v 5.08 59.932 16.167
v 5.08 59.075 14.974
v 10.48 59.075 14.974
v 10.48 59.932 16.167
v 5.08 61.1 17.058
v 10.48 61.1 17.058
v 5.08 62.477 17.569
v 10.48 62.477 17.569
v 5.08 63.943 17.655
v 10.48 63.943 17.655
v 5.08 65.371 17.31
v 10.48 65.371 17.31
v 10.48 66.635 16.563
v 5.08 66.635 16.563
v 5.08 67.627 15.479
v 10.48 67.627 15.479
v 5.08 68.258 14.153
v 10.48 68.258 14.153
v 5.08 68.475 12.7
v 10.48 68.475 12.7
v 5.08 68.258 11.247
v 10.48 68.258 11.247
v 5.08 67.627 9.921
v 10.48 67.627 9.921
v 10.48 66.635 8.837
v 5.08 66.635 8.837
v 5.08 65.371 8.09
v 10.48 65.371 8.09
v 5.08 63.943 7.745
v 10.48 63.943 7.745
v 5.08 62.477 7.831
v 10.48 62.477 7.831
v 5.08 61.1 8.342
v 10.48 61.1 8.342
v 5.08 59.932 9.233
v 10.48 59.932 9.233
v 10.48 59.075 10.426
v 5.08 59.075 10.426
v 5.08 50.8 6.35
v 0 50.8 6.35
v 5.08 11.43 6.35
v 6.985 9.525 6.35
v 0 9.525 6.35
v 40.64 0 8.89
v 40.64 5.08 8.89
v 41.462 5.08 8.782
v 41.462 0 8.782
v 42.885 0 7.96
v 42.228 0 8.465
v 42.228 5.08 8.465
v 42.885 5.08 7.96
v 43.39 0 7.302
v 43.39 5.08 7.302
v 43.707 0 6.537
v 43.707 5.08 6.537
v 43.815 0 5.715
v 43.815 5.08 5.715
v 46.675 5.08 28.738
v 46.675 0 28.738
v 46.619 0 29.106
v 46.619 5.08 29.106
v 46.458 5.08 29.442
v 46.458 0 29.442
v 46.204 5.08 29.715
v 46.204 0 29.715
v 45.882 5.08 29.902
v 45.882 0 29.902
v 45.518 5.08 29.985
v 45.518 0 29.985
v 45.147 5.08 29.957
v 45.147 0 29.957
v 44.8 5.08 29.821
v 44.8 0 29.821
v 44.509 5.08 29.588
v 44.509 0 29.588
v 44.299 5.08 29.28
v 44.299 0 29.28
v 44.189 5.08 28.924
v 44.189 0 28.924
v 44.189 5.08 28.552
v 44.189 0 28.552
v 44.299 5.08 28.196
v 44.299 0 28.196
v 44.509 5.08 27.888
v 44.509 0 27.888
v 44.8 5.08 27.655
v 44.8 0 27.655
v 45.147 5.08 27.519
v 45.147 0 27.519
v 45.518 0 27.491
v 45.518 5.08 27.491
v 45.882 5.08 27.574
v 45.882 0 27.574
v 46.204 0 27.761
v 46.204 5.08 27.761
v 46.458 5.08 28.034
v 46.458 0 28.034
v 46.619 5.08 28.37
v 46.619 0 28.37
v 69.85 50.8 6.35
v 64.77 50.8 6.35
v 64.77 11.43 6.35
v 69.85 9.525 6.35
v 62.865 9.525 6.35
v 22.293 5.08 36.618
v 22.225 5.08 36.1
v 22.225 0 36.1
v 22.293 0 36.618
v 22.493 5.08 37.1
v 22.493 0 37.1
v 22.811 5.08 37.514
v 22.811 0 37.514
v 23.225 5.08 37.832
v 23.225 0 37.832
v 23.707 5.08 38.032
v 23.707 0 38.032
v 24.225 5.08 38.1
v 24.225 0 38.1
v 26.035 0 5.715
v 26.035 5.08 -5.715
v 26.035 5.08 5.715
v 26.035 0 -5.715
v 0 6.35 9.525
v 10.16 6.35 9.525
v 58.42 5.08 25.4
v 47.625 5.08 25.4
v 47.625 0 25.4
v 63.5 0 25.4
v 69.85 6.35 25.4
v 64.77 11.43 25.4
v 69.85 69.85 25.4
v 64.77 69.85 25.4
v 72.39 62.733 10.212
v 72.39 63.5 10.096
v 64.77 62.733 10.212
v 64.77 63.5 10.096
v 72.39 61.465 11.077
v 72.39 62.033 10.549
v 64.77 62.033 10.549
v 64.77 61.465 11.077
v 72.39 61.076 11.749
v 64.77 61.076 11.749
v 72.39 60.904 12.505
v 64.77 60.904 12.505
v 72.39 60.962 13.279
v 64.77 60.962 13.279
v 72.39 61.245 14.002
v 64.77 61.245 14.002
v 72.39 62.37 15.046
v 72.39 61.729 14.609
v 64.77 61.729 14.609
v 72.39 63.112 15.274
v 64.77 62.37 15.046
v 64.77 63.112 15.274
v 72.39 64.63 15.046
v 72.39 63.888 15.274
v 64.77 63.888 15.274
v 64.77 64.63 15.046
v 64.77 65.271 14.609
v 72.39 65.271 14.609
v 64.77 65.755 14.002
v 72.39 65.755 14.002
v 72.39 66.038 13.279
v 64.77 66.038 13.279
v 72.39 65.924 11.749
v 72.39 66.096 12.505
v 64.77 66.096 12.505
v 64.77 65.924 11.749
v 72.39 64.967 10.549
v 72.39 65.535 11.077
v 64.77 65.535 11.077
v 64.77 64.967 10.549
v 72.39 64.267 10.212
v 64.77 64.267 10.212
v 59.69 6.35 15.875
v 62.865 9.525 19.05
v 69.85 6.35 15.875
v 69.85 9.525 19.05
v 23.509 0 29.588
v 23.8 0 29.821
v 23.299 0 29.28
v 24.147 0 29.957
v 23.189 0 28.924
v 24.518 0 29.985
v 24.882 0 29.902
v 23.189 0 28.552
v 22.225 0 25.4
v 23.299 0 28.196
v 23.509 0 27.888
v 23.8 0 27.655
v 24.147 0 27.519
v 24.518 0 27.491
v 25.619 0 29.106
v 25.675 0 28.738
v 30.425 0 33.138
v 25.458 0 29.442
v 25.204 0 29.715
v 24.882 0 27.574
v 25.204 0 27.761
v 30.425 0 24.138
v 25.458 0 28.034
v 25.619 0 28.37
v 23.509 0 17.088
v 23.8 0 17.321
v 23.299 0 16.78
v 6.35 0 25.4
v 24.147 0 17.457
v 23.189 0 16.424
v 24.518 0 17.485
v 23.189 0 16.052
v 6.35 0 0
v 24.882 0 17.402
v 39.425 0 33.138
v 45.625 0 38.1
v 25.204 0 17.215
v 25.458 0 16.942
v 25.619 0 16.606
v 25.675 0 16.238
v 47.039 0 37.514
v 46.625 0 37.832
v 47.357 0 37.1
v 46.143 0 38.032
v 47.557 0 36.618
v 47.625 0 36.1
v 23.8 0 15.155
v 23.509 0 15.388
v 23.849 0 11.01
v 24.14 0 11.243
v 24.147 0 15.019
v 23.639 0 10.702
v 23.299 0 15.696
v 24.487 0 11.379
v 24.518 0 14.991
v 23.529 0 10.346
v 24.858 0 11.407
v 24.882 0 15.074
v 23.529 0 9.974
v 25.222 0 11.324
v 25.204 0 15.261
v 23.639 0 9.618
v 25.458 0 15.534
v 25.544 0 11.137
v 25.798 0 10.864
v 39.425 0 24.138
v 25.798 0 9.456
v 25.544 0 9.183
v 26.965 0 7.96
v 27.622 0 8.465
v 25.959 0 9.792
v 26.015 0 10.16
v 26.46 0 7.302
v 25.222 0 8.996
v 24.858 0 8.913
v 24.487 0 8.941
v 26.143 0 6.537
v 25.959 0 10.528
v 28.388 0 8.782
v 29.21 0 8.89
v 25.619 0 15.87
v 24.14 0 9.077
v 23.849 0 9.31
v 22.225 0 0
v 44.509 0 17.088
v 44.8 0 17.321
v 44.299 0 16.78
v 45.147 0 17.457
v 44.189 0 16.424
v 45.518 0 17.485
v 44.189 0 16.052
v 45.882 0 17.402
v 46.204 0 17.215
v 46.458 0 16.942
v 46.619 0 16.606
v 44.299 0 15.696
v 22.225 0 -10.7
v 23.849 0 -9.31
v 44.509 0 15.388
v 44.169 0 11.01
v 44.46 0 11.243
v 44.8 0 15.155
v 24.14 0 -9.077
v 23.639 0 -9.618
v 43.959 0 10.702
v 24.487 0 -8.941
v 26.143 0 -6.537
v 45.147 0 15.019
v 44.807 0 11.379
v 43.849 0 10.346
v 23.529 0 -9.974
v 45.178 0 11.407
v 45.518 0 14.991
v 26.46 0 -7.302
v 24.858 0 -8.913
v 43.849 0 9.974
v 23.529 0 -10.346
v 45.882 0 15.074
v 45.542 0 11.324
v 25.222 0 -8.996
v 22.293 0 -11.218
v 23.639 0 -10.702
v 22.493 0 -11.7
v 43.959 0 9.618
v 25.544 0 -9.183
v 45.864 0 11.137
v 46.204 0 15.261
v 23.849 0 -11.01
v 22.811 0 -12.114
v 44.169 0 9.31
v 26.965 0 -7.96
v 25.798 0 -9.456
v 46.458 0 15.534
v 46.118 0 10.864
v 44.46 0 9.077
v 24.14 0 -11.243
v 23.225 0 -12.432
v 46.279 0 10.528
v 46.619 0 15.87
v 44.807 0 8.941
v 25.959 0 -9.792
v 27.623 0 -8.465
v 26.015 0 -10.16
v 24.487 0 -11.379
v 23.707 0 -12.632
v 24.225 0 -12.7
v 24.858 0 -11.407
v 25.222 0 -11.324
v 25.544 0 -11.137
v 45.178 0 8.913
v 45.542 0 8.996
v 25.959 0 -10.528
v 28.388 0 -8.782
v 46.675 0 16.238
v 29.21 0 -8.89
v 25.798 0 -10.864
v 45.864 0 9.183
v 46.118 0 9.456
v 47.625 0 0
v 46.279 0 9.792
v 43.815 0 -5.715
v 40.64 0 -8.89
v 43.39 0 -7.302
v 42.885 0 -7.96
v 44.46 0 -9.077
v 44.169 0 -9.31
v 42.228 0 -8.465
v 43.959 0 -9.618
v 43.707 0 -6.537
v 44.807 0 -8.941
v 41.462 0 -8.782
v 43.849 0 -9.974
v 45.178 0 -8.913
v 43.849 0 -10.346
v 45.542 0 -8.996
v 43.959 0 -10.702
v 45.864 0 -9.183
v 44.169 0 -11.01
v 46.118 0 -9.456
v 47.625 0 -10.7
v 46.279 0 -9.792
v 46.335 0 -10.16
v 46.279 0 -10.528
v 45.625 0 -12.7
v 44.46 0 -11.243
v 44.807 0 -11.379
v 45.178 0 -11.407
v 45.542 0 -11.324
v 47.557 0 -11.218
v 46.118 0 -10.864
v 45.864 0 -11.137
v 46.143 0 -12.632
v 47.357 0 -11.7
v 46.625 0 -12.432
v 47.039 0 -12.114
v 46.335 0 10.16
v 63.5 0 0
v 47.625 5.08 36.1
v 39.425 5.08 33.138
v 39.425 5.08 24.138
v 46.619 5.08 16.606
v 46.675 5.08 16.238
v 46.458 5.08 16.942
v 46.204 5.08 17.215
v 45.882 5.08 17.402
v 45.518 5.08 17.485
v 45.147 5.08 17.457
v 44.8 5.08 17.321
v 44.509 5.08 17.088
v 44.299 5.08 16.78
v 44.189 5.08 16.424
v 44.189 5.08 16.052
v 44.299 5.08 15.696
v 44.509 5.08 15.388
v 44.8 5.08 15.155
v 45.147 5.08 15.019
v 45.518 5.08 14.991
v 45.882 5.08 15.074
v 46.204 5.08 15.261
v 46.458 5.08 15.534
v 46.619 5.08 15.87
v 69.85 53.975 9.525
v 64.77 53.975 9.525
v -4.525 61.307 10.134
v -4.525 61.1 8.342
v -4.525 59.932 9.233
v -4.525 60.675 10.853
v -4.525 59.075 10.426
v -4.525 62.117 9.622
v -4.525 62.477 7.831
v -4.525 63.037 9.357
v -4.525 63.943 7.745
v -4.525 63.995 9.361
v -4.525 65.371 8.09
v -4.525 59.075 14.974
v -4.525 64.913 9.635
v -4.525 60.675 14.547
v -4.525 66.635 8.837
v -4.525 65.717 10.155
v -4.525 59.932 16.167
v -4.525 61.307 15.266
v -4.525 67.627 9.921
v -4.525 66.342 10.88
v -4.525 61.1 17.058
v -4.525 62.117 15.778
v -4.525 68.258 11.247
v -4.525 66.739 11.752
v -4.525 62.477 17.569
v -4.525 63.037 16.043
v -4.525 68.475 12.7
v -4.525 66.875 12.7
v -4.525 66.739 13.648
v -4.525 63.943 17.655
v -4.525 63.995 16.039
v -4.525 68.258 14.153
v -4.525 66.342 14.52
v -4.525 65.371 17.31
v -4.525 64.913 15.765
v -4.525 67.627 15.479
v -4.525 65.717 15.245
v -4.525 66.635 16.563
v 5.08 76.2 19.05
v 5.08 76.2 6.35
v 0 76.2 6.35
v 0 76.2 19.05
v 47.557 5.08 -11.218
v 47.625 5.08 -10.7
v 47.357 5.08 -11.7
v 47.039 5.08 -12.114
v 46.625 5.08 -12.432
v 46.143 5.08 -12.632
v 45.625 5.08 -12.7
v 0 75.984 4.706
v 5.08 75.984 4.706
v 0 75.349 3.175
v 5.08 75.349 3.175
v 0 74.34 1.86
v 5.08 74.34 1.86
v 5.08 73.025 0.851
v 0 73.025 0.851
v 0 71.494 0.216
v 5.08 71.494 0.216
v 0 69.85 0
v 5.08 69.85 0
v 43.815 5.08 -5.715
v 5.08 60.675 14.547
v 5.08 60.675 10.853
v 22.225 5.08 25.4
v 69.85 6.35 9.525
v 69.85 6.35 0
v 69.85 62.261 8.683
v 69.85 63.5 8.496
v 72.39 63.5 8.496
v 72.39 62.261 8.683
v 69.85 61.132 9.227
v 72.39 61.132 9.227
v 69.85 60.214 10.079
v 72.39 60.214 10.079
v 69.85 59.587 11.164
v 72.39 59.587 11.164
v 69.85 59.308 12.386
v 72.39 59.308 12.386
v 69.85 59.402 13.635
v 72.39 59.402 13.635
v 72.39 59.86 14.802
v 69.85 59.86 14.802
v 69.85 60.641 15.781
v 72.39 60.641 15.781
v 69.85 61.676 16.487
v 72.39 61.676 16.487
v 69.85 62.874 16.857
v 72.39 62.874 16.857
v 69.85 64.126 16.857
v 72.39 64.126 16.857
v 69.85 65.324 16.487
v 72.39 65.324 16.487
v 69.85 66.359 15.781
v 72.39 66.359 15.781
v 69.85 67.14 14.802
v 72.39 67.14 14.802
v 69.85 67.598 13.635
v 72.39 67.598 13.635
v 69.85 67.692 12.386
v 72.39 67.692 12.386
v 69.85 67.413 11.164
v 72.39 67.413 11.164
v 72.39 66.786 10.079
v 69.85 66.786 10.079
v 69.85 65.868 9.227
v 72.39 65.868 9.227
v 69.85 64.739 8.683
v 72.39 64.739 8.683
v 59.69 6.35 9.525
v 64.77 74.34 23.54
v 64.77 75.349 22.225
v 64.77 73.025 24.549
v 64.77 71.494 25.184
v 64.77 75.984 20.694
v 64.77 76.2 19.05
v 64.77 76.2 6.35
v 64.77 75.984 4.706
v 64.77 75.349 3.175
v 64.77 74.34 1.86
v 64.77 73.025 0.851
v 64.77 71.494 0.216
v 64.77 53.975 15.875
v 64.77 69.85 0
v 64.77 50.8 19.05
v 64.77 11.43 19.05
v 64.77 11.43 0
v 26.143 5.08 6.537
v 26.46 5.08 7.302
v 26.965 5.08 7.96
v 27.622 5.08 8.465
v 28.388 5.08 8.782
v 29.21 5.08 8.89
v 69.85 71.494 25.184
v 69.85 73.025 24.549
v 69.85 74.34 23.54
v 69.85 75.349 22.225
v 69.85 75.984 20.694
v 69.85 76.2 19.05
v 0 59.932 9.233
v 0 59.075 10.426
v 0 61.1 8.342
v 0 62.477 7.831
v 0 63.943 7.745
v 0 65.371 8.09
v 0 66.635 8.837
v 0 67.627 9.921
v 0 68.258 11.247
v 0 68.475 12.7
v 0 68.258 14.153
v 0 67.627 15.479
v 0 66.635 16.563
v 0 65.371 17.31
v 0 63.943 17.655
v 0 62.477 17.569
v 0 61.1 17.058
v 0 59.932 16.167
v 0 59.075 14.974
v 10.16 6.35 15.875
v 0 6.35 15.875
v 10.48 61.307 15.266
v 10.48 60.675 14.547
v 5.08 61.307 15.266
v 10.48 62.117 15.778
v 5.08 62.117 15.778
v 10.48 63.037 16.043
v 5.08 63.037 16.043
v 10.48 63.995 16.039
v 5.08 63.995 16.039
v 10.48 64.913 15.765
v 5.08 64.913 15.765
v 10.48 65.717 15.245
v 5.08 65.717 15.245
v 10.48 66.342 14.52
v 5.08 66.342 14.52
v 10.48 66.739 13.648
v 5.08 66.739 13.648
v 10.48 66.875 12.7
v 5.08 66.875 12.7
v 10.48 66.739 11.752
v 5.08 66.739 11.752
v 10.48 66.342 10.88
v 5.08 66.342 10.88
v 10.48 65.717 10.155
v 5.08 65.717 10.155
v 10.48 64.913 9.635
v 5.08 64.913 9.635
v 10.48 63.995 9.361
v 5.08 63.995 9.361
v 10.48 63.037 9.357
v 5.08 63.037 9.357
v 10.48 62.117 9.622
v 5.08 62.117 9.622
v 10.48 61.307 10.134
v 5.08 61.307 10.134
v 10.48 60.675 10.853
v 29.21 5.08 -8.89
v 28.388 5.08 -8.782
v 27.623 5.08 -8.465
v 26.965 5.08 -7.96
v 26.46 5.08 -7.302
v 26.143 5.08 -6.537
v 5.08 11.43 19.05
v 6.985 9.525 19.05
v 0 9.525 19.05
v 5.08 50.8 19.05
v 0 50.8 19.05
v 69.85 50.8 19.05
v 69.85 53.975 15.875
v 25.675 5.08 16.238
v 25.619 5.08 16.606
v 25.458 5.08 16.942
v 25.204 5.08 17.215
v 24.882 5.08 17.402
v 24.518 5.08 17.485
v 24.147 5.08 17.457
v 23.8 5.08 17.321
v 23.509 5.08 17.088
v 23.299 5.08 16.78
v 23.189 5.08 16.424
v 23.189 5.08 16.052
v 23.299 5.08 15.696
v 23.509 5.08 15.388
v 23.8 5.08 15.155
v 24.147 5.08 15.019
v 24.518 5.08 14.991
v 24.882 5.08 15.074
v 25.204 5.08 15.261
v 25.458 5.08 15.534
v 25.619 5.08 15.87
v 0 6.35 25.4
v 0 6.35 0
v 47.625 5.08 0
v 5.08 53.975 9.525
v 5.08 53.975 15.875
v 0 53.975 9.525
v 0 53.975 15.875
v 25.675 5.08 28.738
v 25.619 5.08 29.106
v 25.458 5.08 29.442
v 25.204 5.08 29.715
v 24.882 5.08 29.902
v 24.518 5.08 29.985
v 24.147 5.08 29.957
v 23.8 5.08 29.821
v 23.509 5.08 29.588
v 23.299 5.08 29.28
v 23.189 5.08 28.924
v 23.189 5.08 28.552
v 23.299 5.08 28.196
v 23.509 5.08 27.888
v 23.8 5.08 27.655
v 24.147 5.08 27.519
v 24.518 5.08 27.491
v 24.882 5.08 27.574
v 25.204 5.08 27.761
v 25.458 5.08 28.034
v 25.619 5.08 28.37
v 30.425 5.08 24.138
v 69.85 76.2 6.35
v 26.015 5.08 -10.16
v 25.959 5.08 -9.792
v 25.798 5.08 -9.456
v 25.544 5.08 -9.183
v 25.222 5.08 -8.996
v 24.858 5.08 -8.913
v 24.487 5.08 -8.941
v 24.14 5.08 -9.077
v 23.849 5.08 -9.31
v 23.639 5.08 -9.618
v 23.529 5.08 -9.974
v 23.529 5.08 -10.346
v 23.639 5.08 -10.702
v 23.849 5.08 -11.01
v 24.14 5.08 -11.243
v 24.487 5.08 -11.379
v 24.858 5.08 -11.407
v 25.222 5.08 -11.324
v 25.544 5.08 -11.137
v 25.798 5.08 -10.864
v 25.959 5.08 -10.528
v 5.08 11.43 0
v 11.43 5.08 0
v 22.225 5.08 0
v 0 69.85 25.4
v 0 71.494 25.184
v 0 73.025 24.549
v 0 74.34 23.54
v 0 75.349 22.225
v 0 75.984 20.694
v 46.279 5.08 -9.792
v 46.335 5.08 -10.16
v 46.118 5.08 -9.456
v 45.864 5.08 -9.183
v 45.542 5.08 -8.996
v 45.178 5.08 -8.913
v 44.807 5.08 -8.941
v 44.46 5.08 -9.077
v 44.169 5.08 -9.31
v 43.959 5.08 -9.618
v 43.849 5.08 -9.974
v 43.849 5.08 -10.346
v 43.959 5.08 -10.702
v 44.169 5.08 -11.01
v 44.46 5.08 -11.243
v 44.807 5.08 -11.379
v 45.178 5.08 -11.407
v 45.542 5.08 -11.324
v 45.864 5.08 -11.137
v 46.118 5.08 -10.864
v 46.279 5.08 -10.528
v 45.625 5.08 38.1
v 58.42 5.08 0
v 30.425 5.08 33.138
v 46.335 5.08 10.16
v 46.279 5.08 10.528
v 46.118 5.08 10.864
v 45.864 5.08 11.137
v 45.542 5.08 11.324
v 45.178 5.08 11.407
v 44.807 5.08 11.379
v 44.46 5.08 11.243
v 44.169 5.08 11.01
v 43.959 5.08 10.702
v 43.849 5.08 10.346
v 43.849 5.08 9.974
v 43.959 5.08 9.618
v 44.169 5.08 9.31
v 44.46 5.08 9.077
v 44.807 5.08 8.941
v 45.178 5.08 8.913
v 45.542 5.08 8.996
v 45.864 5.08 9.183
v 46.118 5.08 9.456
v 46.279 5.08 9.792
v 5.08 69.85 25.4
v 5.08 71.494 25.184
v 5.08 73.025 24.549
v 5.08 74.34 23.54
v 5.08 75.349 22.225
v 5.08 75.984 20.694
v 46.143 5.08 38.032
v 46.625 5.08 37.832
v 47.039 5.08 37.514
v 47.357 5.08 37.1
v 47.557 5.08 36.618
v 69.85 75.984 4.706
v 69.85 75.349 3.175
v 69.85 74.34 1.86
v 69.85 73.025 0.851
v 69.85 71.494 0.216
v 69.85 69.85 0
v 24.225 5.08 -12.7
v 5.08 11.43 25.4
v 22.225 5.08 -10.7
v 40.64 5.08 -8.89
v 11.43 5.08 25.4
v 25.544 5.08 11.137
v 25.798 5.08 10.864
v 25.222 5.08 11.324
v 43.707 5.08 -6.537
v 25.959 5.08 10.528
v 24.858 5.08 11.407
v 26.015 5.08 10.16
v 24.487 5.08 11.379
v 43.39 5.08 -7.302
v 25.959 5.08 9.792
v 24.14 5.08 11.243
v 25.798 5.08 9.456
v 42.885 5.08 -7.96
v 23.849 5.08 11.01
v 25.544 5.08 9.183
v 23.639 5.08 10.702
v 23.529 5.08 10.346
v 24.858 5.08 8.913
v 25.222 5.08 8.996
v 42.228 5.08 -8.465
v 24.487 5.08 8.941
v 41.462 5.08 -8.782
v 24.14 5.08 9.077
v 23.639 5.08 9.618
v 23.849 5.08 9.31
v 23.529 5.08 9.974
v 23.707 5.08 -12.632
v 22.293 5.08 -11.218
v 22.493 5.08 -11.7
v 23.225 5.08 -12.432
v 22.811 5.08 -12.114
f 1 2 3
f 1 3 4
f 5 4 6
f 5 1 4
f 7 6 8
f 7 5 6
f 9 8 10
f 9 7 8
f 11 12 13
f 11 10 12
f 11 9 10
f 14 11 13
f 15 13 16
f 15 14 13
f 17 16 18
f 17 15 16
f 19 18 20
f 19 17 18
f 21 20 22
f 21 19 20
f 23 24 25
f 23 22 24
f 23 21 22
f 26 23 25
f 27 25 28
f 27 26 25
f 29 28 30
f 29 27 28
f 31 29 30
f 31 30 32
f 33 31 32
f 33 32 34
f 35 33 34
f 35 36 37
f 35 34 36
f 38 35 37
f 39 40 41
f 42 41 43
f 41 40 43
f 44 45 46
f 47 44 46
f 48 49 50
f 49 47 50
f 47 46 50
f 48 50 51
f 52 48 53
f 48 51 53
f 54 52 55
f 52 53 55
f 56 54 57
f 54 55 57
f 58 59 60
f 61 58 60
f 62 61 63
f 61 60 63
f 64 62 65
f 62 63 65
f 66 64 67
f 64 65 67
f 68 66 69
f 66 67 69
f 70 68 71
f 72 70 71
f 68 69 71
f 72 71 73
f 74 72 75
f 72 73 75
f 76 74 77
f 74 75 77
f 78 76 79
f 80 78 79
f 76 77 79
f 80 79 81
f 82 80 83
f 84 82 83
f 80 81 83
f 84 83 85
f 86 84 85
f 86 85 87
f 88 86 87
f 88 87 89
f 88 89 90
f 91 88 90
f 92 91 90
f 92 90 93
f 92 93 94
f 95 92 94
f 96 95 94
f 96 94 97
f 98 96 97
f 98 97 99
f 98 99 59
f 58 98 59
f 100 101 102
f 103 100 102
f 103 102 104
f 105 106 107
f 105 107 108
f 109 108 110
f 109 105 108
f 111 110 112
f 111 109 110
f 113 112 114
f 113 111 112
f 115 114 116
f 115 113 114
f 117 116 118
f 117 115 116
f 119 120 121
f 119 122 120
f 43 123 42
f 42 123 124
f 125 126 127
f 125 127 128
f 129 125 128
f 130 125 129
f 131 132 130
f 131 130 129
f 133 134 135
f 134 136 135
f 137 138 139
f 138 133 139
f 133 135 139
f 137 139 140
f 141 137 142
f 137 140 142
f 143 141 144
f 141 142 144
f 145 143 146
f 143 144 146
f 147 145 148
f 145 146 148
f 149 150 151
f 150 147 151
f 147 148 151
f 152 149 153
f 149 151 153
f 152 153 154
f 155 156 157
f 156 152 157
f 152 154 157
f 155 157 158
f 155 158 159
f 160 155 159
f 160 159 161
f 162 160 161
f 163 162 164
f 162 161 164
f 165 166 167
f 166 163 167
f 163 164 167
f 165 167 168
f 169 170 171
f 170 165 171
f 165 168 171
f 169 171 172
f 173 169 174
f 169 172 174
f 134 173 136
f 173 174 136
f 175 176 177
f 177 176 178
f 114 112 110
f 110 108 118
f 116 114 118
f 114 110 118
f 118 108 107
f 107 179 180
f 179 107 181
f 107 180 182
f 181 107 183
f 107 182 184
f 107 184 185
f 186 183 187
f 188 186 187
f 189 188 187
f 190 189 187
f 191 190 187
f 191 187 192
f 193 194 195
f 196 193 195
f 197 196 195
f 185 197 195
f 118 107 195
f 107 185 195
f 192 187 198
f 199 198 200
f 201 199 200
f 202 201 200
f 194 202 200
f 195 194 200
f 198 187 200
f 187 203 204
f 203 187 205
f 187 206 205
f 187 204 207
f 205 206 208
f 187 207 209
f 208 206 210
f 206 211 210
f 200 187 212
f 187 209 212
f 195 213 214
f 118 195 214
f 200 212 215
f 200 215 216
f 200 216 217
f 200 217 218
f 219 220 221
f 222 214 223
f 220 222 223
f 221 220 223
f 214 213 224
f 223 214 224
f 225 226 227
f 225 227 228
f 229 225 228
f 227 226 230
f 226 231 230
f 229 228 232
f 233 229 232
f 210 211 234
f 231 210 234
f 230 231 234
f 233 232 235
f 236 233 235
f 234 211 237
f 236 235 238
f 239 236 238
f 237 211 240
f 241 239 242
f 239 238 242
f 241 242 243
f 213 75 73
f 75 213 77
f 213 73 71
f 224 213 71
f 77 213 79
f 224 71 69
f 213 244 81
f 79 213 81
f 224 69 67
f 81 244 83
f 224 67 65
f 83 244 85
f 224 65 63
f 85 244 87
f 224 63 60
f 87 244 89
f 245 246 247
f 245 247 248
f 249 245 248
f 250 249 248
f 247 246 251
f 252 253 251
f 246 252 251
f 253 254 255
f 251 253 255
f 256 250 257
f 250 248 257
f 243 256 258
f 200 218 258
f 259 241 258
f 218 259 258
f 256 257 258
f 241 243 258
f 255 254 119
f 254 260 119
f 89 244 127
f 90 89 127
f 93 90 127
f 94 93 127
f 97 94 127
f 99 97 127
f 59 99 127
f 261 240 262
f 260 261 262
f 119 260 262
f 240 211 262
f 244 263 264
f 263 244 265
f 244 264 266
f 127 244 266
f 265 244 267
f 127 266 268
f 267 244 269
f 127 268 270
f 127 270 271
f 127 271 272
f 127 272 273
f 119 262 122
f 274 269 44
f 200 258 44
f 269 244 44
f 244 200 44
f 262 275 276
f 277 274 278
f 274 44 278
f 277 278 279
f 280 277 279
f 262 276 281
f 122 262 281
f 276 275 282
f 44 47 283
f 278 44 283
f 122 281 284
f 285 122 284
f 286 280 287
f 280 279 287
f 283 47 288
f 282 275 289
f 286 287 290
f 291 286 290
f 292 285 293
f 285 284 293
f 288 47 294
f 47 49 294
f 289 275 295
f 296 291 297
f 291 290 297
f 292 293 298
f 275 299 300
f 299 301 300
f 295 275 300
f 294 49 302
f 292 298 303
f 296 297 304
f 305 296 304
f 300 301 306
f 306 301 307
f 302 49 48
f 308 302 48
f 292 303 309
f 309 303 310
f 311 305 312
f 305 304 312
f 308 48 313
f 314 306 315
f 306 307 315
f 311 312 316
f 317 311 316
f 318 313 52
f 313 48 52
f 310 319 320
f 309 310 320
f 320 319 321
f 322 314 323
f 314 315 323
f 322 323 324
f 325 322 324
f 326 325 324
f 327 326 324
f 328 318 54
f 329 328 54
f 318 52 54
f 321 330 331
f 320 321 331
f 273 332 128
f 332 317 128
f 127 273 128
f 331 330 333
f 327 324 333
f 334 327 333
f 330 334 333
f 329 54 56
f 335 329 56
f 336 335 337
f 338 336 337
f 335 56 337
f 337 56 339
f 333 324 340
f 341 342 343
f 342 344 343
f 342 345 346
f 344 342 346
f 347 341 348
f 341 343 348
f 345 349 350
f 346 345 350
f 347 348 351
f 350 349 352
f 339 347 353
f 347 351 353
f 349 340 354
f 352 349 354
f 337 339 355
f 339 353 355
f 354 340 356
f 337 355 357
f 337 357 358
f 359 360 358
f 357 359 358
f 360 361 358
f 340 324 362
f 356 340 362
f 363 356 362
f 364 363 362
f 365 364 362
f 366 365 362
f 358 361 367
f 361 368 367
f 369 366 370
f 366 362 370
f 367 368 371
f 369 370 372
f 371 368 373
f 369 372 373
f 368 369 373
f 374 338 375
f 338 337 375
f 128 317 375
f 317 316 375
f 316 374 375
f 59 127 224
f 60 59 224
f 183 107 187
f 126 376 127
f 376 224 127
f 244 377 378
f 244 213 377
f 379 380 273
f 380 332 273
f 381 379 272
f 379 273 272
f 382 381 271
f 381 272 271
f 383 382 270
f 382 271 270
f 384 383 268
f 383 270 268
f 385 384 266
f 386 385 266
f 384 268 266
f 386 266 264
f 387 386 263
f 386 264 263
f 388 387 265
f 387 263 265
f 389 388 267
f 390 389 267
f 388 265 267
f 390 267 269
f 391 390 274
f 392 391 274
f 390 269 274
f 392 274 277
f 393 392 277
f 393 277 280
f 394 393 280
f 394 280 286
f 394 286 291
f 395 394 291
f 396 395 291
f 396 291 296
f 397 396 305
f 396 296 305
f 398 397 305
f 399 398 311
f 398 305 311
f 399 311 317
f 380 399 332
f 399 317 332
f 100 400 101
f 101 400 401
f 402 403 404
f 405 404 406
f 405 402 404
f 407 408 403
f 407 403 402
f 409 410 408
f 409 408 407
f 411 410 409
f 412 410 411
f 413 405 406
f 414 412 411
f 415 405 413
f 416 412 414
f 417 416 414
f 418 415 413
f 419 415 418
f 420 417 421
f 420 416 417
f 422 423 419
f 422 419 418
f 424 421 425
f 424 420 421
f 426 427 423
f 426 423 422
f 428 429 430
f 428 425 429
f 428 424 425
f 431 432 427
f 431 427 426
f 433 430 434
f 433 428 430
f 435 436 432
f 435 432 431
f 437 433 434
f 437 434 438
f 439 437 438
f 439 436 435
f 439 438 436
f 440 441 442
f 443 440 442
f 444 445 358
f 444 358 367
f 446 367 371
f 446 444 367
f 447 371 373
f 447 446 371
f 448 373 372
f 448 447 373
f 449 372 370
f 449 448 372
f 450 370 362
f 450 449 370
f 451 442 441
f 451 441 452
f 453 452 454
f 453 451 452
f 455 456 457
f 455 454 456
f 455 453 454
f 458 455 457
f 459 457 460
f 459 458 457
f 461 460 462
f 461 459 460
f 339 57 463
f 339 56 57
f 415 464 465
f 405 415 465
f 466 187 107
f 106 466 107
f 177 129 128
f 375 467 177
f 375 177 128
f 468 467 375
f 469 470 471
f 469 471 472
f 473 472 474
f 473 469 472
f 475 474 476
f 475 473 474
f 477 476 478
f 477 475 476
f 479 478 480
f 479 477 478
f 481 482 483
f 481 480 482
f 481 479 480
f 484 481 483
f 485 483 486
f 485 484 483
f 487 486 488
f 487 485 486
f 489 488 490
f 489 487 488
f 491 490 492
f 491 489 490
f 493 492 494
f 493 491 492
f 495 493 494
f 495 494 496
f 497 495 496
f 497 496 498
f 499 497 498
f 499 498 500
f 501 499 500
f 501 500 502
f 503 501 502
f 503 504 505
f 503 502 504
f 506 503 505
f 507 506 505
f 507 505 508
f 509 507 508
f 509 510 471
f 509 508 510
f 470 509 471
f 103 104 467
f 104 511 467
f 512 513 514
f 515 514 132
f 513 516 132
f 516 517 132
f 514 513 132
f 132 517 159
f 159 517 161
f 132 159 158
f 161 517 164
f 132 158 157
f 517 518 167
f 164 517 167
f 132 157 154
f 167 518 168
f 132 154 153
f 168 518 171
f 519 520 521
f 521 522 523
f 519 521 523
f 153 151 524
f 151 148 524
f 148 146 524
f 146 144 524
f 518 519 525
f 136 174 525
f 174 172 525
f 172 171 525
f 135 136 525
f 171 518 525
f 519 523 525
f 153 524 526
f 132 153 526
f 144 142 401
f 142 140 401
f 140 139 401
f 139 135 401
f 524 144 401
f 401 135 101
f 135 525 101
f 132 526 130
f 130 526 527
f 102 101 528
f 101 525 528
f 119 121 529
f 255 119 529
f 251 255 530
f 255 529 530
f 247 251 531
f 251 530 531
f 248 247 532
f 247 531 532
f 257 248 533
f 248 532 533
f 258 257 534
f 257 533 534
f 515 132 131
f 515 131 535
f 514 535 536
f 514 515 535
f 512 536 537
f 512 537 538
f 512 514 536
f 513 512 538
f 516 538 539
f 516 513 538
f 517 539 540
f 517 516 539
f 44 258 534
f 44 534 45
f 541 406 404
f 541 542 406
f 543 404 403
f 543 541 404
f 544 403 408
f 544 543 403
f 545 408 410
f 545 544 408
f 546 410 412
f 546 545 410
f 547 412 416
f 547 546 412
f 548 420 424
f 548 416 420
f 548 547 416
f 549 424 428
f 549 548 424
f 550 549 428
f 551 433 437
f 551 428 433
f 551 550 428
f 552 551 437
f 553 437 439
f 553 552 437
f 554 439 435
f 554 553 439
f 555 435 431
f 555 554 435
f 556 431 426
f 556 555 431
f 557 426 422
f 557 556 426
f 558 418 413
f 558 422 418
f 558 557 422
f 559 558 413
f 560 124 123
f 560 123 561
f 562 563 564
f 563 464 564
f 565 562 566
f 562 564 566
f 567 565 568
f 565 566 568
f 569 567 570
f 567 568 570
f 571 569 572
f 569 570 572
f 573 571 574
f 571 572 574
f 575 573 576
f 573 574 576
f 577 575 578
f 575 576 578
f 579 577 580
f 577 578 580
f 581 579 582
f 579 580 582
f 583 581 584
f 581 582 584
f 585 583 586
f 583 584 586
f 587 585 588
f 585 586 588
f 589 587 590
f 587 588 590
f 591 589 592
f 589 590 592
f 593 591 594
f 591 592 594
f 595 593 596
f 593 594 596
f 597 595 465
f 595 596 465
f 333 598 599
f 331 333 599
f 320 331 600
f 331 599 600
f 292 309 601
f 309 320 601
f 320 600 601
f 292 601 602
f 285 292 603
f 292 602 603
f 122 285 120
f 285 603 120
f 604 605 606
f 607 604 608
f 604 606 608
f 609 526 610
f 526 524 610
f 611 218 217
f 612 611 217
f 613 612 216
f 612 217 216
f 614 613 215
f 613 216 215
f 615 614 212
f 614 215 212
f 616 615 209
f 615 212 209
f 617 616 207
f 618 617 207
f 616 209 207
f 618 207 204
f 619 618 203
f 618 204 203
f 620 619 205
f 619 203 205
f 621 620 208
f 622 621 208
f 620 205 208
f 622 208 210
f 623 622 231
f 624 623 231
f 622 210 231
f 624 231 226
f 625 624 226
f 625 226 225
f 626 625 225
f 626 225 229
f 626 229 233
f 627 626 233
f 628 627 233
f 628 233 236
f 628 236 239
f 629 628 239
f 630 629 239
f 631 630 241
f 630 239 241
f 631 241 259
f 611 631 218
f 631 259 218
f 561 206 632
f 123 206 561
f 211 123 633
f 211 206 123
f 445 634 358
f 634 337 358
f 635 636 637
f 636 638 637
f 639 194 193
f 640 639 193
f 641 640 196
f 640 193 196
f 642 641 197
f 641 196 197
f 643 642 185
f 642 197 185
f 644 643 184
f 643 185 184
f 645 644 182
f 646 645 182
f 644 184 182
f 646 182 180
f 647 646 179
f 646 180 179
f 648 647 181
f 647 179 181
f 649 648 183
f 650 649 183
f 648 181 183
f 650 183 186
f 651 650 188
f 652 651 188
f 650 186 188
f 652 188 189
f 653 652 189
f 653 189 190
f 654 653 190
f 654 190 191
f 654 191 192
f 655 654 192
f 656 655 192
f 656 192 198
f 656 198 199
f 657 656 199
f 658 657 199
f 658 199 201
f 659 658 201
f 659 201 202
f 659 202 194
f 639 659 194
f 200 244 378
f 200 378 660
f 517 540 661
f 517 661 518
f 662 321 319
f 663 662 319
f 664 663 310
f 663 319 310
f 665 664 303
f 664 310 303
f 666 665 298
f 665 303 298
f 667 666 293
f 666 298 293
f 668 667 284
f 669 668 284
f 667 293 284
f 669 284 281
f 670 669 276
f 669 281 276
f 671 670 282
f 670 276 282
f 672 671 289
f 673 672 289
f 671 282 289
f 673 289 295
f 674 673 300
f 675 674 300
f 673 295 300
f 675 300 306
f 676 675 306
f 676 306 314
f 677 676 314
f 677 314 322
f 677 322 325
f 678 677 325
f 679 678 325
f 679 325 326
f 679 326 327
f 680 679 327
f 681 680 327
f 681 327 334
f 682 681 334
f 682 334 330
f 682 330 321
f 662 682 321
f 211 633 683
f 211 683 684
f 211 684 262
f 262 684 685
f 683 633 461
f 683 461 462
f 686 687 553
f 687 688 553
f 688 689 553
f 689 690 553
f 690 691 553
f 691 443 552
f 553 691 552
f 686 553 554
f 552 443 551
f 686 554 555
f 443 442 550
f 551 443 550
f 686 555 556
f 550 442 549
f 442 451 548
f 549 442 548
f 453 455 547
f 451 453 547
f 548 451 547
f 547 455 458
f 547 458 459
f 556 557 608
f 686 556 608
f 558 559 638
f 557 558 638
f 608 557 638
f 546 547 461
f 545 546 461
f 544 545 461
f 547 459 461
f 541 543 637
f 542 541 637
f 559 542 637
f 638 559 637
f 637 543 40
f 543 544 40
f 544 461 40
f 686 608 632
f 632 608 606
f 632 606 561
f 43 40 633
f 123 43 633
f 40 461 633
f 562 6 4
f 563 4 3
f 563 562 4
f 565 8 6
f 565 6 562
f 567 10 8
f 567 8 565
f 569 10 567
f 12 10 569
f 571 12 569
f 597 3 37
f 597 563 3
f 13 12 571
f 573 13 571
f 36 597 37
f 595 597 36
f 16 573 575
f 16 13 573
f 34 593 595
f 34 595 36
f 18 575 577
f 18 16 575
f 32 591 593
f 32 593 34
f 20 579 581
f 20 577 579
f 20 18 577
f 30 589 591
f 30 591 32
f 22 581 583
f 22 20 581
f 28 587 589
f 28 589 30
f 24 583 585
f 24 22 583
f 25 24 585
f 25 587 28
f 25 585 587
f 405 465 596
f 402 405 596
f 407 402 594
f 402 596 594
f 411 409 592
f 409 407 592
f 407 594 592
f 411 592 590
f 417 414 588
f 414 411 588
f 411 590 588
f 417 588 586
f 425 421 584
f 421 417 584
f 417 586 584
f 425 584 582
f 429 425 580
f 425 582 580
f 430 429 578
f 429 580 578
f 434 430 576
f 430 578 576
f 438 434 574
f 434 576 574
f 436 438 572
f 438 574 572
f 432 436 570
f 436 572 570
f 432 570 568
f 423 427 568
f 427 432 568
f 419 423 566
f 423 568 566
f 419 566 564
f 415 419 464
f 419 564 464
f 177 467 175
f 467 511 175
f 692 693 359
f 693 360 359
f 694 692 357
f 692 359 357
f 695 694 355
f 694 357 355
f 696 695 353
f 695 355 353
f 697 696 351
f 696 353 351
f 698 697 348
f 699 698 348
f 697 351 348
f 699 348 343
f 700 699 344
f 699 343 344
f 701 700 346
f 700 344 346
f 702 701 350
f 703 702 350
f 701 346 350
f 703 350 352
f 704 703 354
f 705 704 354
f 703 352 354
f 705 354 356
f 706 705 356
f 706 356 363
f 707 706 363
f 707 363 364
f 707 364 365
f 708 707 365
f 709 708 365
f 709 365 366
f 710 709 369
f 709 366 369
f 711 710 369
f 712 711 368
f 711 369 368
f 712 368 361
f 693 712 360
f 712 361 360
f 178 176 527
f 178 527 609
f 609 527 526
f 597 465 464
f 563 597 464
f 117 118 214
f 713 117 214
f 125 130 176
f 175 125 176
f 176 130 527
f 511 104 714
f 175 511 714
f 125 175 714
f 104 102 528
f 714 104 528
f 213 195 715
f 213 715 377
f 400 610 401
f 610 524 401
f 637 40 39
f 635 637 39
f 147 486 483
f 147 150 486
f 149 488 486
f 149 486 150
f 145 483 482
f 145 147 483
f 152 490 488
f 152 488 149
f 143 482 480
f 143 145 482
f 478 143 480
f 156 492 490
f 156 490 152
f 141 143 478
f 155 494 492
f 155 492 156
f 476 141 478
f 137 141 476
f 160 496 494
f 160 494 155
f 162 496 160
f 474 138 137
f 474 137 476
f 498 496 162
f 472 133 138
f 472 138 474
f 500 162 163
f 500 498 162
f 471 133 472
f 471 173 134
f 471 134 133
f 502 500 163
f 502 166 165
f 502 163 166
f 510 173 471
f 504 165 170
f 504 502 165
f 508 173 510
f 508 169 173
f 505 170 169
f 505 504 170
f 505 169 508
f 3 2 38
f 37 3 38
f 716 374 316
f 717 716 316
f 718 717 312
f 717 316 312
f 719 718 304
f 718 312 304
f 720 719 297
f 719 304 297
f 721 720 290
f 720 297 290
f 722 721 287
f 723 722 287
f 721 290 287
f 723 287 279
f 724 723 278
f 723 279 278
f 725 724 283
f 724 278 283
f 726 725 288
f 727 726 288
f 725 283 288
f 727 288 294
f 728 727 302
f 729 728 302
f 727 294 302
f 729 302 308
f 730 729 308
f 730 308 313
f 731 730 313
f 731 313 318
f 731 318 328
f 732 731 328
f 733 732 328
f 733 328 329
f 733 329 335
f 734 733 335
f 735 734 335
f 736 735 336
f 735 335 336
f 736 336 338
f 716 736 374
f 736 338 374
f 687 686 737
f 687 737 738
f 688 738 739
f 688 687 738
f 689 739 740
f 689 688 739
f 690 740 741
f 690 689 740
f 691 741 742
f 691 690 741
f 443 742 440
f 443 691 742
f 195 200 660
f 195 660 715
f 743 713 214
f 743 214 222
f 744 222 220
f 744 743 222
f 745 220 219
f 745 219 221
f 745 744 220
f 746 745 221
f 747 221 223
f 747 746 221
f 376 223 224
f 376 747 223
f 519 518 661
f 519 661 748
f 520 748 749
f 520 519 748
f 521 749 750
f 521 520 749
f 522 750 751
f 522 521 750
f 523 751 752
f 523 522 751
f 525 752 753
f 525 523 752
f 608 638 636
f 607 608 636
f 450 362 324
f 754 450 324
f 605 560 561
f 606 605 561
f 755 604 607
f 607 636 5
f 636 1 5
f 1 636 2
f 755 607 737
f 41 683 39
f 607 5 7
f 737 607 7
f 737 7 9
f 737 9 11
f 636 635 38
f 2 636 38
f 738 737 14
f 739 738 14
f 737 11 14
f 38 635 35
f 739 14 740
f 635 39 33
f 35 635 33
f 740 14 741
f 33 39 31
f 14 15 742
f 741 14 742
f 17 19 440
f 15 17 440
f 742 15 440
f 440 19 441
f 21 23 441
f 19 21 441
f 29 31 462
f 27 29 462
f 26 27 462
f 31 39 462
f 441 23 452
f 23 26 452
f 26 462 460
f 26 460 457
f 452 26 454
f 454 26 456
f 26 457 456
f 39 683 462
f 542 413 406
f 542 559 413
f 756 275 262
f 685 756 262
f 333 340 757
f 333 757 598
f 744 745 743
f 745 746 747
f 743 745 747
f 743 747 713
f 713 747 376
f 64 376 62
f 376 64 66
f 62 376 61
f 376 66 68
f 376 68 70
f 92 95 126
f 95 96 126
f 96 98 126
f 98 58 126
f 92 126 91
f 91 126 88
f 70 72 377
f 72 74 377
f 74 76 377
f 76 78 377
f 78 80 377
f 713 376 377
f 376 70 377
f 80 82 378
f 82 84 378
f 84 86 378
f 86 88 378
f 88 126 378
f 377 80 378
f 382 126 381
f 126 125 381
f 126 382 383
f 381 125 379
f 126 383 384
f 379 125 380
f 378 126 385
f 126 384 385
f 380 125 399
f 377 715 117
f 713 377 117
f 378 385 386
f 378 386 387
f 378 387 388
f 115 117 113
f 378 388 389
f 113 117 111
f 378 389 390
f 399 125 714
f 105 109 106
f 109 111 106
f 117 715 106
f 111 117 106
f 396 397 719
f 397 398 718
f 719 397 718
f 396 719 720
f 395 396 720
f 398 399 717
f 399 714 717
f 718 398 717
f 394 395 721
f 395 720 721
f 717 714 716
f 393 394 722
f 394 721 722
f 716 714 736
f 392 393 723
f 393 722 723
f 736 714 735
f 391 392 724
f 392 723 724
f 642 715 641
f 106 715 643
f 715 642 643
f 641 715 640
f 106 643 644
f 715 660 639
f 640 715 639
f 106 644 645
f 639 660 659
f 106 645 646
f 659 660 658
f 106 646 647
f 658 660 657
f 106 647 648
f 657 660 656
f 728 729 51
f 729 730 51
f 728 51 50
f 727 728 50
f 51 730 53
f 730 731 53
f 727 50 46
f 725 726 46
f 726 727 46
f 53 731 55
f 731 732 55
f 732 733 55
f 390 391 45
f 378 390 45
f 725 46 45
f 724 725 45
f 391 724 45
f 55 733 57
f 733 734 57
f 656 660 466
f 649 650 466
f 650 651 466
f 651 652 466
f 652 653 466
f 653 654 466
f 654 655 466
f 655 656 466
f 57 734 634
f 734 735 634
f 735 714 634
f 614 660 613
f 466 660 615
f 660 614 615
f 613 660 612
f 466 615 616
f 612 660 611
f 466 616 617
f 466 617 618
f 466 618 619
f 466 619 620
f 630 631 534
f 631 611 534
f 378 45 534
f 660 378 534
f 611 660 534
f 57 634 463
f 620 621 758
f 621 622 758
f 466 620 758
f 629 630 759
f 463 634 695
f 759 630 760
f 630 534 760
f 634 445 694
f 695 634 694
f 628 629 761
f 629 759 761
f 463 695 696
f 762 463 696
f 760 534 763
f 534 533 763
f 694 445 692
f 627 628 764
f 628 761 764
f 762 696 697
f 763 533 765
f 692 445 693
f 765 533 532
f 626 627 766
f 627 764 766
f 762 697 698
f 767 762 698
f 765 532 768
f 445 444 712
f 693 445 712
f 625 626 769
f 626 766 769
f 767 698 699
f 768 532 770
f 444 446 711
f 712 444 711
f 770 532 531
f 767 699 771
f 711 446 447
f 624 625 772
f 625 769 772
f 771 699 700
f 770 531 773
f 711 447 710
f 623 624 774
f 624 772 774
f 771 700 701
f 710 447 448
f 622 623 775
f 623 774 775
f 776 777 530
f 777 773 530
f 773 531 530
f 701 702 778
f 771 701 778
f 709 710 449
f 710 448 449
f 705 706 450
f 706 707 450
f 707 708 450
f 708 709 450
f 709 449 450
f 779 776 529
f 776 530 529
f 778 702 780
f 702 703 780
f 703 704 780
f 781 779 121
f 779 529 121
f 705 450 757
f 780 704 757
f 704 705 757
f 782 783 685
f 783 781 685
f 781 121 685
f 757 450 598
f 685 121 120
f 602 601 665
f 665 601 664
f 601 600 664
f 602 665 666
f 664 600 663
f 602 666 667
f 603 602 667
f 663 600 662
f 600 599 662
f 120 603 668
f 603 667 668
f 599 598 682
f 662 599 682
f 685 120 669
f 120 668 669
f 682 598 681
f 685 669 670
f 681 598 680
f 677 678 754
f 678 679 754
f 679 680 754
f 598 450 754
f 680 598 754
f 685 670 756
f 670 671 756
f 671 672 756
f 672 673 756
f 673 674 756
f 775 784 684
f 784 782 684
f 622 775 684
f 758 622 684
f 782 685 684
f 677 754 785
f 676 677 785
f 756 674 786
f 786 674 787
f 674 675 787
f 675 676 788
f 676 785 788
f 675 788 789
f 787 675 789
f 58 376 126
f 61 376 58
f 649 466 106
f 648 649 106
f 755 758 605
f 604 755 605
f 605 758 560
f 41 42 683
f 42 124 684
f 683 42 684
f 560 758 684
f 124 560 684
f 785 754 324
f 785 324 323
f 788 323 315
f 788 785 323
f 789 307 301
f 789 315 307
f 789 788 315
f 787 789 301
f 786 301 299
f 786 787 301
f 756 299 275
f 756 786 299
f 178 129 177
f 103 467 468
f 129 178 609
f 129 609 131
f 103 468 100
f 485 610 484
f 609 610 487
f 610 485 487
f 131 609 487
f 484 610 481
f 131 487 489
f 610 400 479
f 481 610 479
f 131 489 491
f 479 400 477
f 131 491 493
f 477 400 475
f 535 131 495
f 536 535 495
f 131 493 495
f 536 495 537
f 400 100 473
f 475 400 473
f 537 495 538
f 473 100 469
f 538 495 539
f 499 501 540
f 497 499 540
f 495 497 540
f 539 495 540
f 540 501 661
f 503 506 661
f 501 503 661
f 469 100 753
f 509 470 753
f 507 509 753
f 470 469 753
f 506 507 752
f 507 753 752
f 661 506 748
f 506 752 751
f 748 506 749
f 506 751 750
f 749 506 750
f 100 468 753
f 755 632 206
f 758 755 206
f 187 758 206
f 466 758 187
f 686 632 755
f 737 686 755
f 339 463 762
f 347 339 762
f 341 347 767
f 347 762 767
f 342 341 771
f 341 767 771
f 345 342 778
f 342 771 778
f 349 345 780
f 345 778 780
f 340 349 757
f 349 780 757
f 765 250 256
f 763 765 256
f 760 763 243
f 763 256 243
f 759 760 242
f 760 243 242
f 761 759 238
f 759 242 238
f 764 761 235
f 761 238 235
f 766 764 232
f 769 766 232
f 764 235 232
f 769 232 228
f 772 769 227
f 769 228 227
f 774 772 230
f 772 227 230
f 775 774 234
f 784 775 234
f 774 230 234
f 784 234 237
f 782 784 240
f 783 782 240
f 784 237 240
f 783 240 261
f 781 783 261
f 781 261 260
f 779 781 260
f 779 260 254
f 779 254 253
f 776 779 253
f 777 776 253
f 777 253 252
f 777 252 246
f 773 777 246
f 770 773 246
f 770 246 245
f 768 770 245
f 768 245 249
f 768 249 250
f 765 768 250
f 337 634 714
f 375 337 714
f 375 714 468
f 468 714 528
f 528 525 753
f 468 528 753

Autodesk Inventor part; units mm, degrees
ref_plane "YZ Plane" through (0, 0, 0) normal (1, 0, 0) x (0, 1, 0)
ref_plane "XZ Plane" through (0, 0, 0) normal (0, 1, 0) x (-1, 0, 0)
ref_plane "XY Plane" through (0, 0, 0) normal (0, 0, 1) x (1, 0, 0)
sketch "Sketch1" plane through (0, 0, 0) normal (0, 0, 1) x (1, 0, 0)
  line L0 (0, 0) -> (69.85, 0)
  line L1 (69.85, 0) -> (69.85, 76.2)
  line L2 (0, 76.2) -> (0, 0)
  line L3 (64.77, 76.2) -> (64.77, 5.08)
  line L4 (64.77, 5.08) -> (5.08, 5.08)
  line L5 (5.08, 5.08) -> (5.08, 76.2)
  line L6 (69.85, 76.2) -> (64.77, 76.2)
  line L7 (5.08, 76.2) -> (0, 76.2)
  dimension "d0" = 69.85
  dimension "d1" = 5.08
  dimension "d2" = 5.08
  dimension "d3" = 76.2
extrude "Extrusion1" add sketch "Sketch1" along normal blind 25.4
sketch "Sketch2" plane through (0, 0, 0) normal (0, -1, 0) x (1, 0, 0)
  line L0 (22.225, 38.1) -> (47.625, 38.1)
  line L1 (47.625, 38.1) -> (47.625, -12.7)
  line L2 (47.625, -12.7) -> (22.225, -12.7)
  line L3 (22.225, -12.7) -> (22.225, 38.1)
  line L4 (0, 25.4) -> (69.85, 25.4) construction
  line L5 (0, 25.4) -> (22.225, 38.1) construction
  line L6 (0, 0) -> (69.85, 0) construction
  line L7 (0, 0) -> (22.225, -12.7) construction
  line L8 (47.625, 38.1) -> (69.85, 25.4) construction
  line L9 (47.625, -12.7) -> (69.85, 0) construction
  dimension "d6" = 50.8
  dimension "d7" = 25.4
extrude "Extrusion2" add sketch "Sketch2" against normal up to surface (5.08 mm away)
sketch "Sketch3" plane through (69.85, 0, 0) normal (0, -1, 0) x (1, 0, 0)
  line L0 (-22.225, 38.1) -> (-47.625, 38.1) construction
  line L1 (-47.425, 38.1) -> (-22.425, 38.1) construction
  line L2 (-22.425, 38.1) -> (-22.425, 14.238) construction
  line L3 (-22.425, 14.238) -> (-47.425, 14.238) construction
  line L4 (-47.425, 14.238) -> (-47.425, 38.1) construction
  line L5 (-5.08, 25.4) -> (-22.225, 25.4) construction
  line L6 (-22.225, 25.4) -> (-22.425, 25.4) construction
  line L7 (-69.85, 25.4) -> (-47.625, 25.4) construction
  line L8 (-47.625, 25.4) -> (-47.425, 25.4) construction
  circle A0 centre (-45.425, 16.238) radius 1.25
  circle A1 centre (-24.425, 16.238) radius 1.25
  circle A2 centre (-45.425, 28.738) radius 1.25
  circle A3 centre (-24.425, 28.738) radius 1.25
  line L9 (-39.425, 33.138) -> (-30.425, 33.138)
  line L10 (-30.425, 33.138) -> (-30.425, 24.138)
  line L11 (-30.425, 24.138) -> (-39.425, 24.138)
  line L12 (-39.425, 24.138) -> (-39.425, 33.138)
  line L13 (-39.425, 33.138) -> (-30.425, 24.138) construction
  line L14 (-39.425, 24.138) -> (-30.425, 33.138) construction
  point P0 (-69.85, 0)
  point P1 (-34.925, 28.638)
  dimension "d10" = 23.862
  dimension "d11" = 25
  dimension "d12" = 2.5
  dimension "d13" = 2
  dimension "d14" = 2
  dimension "d15" = 2
  dimension "d16" = 14.5
  dimension "d17" = 9
  dimension "d18" = 9.462
  dimension "d19" = 12.5
extrude "Extrusion3" cut sketch "Sketch3" against normal up to surface (5.08 mm away)
sketch "Sketch4" plane through (0, 0, 0) normal (0, -1, 0) x (1, 0, 0)
  line L0 (22.225, 0) -> (22.225, -12.7) construction
  line L1 (22.225, -12.7) -> (47.625, -12.7) construction
  line L2 (47.625, -12.7) -> (47.625, 12.7) construction
  line L3 (47.625, 12.7) -> (22.225, 12.7) construction
  line L4 (22.225, 12.7) -> (22.225, -12.7) construction
  line L5 (47.625, -12.7) -> (47.625, 0) construction
  line L6 (22.225, 12.7) -> (47.625, -12.7) construction
  line L7 (47.625, 12.7) -> (22.225, -12.7) construction
  line L8 (26.035, 8.89) -> (43.815, 8.89)
  line L9 (43.815, 8.89) -> (43.815, -8.89)
  line L10 (43.815, -8.89) -> (26.035, -8.89)
  line L11 (26.035, -8.89) -> (26.035, 8.89)
  circle A0 centre (24.765, 10.16) radius 1.25
  circle A1 centre (45.085, 10.16) radius 1.25
  circle A2 centre (45.085, -10.16) radius 1.25
  circle A3 centre (24.765, -10.16) radius 1.25
  point P0 (0, 0)
  dimension "d22" = 2.5
  dimension "d23" = 20.32
  dimension "d24" = 17.78
extrude "Extrusion4" cut sketch "Sketch4" against normal up to surface (5.08 mm away)
sketch "Sketch5" plane through (0, 0, 0) normal (-1, 0, 0) x (0, 0, 1)
  line L0 (0, 76.2) -> (25.4, 76.2) construction
  line L1 (0, 76.2) -> (0, 5.08) construction
  line L2 (25.4, 76.2) -> (0, 76.2) construction
  line L3 (0, 76.2) -> (0, 50.8) construction
  line L4 (0, 50.8) -> (25.4, 50.8) construction
  line L5 (25.4, 50.8) -> (25.4, 76.2) construction
  line L6 (25.4, 76.2) -> (0, 50.8) construction
  line L7 (25.4, 50.8) -> (0, 76.2) construction
  arc A0 (14.4861, 60.875) -> (10.9139, 60.875) centre (12.7, 63.5) ccw construction
  line L8 (14.4861, 60.875) -> (10.9139, 60.875) construction
  line L9 (10.8534, 60.675) -> (14.5466, 60.675)
  arc A1 (14.5466, 60.675) -> (10.8534, 60.675) centre (12.7, 63.5) ccw
  point P0 (0, 0)
  dimension "d27" = 25.4
  dimension "d28" = 6.35
  dimension "d29" = 5.8
  dimension "d54" = 0.2
extrude "Extrusion5" cut sketch "Sketch5" against normal up to surface (5.08 mm away)
sketch "Sketch6" plane through (69.85, 0, 0) normal (1, 0, 0) x (0, 0, -1)
  line L0 (-25.4, 76.2) -> (-25.4, 0) construction
  line L1 (-25.4, 76.2) -> (0, 50.8) construction
  line L2 (0, 76.2) -> (0, 0) construction
  line L3 (0, 76.2) -> (-25.4, 76.2) construction
  line L4 (0, 76.2) -> (-25.4, 50.8) construction
  line L5 (-25.4, 0) -> (-25.4, 76.2) construction
  line L6 (-25.4, 50.8) -> (0, 50.8) construction
  line L7 (-25.4, 5.08) -> (-25.4, 76.2) projected
  circle A0 centre (-12.7, 63.5) radius 2.6035
  dimension "d52" = 25.4
  dimension "d53" = 5.207
extrude "Extrusion6" cut sketch "Sketch6" against normal up to surface (5.08 mm away)
fillet "Fillet1" radius 2 4 edges at (47.625, 2.54, 38.1) (22.225, 2.54, 38.1) (22.225, 2.54, -12.7) (47.625, 2.54, -12.7)
fillet "Fillet2" radius 6.35 4 edges at (67.31, 76.2, 25.4) (67.31, 76.2, 0) (2.54, 76.2, 25.4) (2.54, 76.2, 0)
chamfer "Chamfer1" distance 6.35 angle 45 4 edges at (0, 0, 12.7) (5.08, 5.08, 12.7) (69.85, 0, 12.7) (64.77, 5.08, 12.7)
sketch "Sketch7" plane through (0, 76.2, 6.35) normal (-1, 0, 0) x (0, 0, 1)
  line L0 (12.7, -22.225) -> (0, -22.225)
  line L1 (0, -22.225) -> (0, -69.85)
  line L2 (0, -69.85) -> (12.7, -69.85)
  line L3 (12.7, -69.85) -> (12.7, -22.225)
  line L4 (-6.35, -6.35) -> (-6.35, -69.85) projected
  line L5 (19.05, -69.85) -> (-6.35, -69.85) projected
  line L6 (19.05, -6.35) -> (19.05, -69.85) projected
  arc A0 (8.975, -10.9139) -> (8.975, -14.4861) centre (6.35, -12.7) ccw projected
  point P0 (-6.35, -76.2)
  dimension "d42" = 6.35
  dimension "d43" = 0
  dimension "d44" = 6.35
  dimension "d46" = 6.35
extrude "Extrusion7" cut sketch "Sketch7" against normal through all
chamfer "Chamfer2" distance 3.175 angle 45 8 edges at (64.77, 6.35, 19.05) (64.77, 6.35, 6.35) (67.31, 53.975, 6.35) (67.31, 53.975, 19.05) (5.08, 6.35, 6.35) (5.08, 6.35, 19.05) (2.54, 53.975, 19.05) (2.54, 53.975, 6.35)
fillet "Fillet3" radius 3.175 4 edges at (26.035, 2.54, 8.89) (26.035, 2.54, -8.89) (43.815, 2.54, -8.89) (43.815, 2.54, 8.89)
sketch "Sketch8" plane through (0, 76.2, 6.35) normal (-1, 0, 0) x (0, 0, 1)
  arc A0 (8.1966, -15.525) -> (4.5034, -15.525) centre (6.35, -12.7) ccw projected
  line L0 (8.1966, -15.525) -> (4.5034, -15.525) projected
  arc A1 (8.6238, -17.125) -> (4.0762, -17.125) centre (6.35, -12.7) ccw
  line L1 (8.6238, -17.125) -> (4.0762, -17.125)
  point P0 (-6.35, -76.2)
  dimension "d56" = 1.6
extrude "Extrusion8" add sketch "Sketch8" along normal blind 4.525
sketch "Sketch9" plane through (5.08, 76.2, 19.05) normal (1, 0, 0) x (0, 0, -1)
  line L0 (8.1966, -15.525) -> (4.5034, -15.525) projected
  arc A0 (8.1966, -15.525) -> (4.5034, -15.525) centre (6.35, -12.7) ccw projected
  line L1 (4.0762, -17.125) -> (8.6238, -17.125)
  arc A1 (8.6238, -17.125) -> (4.0762, -17.125) centre (6.35, -12.7) ccw
  point P0 (19.05, -76.2)
  dimension "d59" = 1.6
extrude "Extrusion9" add sketch "Sketch9" along normal blind 5.4
sketch "Sketch10" plane through (69.85, 76.2, 19.05) normal (1, 0, 0) x (0, 0, -1)
  circle A0 centre (6.35, -12.7) radius 2.6035 projected
  circle A1 centre (6.35, -12.7) radius 4.2035
  point P0 (19.05, -76.2)
  dimension "d62" = 1.6
extrude "Extrusion10" add sketch "Sketch10" along normal blind 2.54
properties part number "HoseMount"
